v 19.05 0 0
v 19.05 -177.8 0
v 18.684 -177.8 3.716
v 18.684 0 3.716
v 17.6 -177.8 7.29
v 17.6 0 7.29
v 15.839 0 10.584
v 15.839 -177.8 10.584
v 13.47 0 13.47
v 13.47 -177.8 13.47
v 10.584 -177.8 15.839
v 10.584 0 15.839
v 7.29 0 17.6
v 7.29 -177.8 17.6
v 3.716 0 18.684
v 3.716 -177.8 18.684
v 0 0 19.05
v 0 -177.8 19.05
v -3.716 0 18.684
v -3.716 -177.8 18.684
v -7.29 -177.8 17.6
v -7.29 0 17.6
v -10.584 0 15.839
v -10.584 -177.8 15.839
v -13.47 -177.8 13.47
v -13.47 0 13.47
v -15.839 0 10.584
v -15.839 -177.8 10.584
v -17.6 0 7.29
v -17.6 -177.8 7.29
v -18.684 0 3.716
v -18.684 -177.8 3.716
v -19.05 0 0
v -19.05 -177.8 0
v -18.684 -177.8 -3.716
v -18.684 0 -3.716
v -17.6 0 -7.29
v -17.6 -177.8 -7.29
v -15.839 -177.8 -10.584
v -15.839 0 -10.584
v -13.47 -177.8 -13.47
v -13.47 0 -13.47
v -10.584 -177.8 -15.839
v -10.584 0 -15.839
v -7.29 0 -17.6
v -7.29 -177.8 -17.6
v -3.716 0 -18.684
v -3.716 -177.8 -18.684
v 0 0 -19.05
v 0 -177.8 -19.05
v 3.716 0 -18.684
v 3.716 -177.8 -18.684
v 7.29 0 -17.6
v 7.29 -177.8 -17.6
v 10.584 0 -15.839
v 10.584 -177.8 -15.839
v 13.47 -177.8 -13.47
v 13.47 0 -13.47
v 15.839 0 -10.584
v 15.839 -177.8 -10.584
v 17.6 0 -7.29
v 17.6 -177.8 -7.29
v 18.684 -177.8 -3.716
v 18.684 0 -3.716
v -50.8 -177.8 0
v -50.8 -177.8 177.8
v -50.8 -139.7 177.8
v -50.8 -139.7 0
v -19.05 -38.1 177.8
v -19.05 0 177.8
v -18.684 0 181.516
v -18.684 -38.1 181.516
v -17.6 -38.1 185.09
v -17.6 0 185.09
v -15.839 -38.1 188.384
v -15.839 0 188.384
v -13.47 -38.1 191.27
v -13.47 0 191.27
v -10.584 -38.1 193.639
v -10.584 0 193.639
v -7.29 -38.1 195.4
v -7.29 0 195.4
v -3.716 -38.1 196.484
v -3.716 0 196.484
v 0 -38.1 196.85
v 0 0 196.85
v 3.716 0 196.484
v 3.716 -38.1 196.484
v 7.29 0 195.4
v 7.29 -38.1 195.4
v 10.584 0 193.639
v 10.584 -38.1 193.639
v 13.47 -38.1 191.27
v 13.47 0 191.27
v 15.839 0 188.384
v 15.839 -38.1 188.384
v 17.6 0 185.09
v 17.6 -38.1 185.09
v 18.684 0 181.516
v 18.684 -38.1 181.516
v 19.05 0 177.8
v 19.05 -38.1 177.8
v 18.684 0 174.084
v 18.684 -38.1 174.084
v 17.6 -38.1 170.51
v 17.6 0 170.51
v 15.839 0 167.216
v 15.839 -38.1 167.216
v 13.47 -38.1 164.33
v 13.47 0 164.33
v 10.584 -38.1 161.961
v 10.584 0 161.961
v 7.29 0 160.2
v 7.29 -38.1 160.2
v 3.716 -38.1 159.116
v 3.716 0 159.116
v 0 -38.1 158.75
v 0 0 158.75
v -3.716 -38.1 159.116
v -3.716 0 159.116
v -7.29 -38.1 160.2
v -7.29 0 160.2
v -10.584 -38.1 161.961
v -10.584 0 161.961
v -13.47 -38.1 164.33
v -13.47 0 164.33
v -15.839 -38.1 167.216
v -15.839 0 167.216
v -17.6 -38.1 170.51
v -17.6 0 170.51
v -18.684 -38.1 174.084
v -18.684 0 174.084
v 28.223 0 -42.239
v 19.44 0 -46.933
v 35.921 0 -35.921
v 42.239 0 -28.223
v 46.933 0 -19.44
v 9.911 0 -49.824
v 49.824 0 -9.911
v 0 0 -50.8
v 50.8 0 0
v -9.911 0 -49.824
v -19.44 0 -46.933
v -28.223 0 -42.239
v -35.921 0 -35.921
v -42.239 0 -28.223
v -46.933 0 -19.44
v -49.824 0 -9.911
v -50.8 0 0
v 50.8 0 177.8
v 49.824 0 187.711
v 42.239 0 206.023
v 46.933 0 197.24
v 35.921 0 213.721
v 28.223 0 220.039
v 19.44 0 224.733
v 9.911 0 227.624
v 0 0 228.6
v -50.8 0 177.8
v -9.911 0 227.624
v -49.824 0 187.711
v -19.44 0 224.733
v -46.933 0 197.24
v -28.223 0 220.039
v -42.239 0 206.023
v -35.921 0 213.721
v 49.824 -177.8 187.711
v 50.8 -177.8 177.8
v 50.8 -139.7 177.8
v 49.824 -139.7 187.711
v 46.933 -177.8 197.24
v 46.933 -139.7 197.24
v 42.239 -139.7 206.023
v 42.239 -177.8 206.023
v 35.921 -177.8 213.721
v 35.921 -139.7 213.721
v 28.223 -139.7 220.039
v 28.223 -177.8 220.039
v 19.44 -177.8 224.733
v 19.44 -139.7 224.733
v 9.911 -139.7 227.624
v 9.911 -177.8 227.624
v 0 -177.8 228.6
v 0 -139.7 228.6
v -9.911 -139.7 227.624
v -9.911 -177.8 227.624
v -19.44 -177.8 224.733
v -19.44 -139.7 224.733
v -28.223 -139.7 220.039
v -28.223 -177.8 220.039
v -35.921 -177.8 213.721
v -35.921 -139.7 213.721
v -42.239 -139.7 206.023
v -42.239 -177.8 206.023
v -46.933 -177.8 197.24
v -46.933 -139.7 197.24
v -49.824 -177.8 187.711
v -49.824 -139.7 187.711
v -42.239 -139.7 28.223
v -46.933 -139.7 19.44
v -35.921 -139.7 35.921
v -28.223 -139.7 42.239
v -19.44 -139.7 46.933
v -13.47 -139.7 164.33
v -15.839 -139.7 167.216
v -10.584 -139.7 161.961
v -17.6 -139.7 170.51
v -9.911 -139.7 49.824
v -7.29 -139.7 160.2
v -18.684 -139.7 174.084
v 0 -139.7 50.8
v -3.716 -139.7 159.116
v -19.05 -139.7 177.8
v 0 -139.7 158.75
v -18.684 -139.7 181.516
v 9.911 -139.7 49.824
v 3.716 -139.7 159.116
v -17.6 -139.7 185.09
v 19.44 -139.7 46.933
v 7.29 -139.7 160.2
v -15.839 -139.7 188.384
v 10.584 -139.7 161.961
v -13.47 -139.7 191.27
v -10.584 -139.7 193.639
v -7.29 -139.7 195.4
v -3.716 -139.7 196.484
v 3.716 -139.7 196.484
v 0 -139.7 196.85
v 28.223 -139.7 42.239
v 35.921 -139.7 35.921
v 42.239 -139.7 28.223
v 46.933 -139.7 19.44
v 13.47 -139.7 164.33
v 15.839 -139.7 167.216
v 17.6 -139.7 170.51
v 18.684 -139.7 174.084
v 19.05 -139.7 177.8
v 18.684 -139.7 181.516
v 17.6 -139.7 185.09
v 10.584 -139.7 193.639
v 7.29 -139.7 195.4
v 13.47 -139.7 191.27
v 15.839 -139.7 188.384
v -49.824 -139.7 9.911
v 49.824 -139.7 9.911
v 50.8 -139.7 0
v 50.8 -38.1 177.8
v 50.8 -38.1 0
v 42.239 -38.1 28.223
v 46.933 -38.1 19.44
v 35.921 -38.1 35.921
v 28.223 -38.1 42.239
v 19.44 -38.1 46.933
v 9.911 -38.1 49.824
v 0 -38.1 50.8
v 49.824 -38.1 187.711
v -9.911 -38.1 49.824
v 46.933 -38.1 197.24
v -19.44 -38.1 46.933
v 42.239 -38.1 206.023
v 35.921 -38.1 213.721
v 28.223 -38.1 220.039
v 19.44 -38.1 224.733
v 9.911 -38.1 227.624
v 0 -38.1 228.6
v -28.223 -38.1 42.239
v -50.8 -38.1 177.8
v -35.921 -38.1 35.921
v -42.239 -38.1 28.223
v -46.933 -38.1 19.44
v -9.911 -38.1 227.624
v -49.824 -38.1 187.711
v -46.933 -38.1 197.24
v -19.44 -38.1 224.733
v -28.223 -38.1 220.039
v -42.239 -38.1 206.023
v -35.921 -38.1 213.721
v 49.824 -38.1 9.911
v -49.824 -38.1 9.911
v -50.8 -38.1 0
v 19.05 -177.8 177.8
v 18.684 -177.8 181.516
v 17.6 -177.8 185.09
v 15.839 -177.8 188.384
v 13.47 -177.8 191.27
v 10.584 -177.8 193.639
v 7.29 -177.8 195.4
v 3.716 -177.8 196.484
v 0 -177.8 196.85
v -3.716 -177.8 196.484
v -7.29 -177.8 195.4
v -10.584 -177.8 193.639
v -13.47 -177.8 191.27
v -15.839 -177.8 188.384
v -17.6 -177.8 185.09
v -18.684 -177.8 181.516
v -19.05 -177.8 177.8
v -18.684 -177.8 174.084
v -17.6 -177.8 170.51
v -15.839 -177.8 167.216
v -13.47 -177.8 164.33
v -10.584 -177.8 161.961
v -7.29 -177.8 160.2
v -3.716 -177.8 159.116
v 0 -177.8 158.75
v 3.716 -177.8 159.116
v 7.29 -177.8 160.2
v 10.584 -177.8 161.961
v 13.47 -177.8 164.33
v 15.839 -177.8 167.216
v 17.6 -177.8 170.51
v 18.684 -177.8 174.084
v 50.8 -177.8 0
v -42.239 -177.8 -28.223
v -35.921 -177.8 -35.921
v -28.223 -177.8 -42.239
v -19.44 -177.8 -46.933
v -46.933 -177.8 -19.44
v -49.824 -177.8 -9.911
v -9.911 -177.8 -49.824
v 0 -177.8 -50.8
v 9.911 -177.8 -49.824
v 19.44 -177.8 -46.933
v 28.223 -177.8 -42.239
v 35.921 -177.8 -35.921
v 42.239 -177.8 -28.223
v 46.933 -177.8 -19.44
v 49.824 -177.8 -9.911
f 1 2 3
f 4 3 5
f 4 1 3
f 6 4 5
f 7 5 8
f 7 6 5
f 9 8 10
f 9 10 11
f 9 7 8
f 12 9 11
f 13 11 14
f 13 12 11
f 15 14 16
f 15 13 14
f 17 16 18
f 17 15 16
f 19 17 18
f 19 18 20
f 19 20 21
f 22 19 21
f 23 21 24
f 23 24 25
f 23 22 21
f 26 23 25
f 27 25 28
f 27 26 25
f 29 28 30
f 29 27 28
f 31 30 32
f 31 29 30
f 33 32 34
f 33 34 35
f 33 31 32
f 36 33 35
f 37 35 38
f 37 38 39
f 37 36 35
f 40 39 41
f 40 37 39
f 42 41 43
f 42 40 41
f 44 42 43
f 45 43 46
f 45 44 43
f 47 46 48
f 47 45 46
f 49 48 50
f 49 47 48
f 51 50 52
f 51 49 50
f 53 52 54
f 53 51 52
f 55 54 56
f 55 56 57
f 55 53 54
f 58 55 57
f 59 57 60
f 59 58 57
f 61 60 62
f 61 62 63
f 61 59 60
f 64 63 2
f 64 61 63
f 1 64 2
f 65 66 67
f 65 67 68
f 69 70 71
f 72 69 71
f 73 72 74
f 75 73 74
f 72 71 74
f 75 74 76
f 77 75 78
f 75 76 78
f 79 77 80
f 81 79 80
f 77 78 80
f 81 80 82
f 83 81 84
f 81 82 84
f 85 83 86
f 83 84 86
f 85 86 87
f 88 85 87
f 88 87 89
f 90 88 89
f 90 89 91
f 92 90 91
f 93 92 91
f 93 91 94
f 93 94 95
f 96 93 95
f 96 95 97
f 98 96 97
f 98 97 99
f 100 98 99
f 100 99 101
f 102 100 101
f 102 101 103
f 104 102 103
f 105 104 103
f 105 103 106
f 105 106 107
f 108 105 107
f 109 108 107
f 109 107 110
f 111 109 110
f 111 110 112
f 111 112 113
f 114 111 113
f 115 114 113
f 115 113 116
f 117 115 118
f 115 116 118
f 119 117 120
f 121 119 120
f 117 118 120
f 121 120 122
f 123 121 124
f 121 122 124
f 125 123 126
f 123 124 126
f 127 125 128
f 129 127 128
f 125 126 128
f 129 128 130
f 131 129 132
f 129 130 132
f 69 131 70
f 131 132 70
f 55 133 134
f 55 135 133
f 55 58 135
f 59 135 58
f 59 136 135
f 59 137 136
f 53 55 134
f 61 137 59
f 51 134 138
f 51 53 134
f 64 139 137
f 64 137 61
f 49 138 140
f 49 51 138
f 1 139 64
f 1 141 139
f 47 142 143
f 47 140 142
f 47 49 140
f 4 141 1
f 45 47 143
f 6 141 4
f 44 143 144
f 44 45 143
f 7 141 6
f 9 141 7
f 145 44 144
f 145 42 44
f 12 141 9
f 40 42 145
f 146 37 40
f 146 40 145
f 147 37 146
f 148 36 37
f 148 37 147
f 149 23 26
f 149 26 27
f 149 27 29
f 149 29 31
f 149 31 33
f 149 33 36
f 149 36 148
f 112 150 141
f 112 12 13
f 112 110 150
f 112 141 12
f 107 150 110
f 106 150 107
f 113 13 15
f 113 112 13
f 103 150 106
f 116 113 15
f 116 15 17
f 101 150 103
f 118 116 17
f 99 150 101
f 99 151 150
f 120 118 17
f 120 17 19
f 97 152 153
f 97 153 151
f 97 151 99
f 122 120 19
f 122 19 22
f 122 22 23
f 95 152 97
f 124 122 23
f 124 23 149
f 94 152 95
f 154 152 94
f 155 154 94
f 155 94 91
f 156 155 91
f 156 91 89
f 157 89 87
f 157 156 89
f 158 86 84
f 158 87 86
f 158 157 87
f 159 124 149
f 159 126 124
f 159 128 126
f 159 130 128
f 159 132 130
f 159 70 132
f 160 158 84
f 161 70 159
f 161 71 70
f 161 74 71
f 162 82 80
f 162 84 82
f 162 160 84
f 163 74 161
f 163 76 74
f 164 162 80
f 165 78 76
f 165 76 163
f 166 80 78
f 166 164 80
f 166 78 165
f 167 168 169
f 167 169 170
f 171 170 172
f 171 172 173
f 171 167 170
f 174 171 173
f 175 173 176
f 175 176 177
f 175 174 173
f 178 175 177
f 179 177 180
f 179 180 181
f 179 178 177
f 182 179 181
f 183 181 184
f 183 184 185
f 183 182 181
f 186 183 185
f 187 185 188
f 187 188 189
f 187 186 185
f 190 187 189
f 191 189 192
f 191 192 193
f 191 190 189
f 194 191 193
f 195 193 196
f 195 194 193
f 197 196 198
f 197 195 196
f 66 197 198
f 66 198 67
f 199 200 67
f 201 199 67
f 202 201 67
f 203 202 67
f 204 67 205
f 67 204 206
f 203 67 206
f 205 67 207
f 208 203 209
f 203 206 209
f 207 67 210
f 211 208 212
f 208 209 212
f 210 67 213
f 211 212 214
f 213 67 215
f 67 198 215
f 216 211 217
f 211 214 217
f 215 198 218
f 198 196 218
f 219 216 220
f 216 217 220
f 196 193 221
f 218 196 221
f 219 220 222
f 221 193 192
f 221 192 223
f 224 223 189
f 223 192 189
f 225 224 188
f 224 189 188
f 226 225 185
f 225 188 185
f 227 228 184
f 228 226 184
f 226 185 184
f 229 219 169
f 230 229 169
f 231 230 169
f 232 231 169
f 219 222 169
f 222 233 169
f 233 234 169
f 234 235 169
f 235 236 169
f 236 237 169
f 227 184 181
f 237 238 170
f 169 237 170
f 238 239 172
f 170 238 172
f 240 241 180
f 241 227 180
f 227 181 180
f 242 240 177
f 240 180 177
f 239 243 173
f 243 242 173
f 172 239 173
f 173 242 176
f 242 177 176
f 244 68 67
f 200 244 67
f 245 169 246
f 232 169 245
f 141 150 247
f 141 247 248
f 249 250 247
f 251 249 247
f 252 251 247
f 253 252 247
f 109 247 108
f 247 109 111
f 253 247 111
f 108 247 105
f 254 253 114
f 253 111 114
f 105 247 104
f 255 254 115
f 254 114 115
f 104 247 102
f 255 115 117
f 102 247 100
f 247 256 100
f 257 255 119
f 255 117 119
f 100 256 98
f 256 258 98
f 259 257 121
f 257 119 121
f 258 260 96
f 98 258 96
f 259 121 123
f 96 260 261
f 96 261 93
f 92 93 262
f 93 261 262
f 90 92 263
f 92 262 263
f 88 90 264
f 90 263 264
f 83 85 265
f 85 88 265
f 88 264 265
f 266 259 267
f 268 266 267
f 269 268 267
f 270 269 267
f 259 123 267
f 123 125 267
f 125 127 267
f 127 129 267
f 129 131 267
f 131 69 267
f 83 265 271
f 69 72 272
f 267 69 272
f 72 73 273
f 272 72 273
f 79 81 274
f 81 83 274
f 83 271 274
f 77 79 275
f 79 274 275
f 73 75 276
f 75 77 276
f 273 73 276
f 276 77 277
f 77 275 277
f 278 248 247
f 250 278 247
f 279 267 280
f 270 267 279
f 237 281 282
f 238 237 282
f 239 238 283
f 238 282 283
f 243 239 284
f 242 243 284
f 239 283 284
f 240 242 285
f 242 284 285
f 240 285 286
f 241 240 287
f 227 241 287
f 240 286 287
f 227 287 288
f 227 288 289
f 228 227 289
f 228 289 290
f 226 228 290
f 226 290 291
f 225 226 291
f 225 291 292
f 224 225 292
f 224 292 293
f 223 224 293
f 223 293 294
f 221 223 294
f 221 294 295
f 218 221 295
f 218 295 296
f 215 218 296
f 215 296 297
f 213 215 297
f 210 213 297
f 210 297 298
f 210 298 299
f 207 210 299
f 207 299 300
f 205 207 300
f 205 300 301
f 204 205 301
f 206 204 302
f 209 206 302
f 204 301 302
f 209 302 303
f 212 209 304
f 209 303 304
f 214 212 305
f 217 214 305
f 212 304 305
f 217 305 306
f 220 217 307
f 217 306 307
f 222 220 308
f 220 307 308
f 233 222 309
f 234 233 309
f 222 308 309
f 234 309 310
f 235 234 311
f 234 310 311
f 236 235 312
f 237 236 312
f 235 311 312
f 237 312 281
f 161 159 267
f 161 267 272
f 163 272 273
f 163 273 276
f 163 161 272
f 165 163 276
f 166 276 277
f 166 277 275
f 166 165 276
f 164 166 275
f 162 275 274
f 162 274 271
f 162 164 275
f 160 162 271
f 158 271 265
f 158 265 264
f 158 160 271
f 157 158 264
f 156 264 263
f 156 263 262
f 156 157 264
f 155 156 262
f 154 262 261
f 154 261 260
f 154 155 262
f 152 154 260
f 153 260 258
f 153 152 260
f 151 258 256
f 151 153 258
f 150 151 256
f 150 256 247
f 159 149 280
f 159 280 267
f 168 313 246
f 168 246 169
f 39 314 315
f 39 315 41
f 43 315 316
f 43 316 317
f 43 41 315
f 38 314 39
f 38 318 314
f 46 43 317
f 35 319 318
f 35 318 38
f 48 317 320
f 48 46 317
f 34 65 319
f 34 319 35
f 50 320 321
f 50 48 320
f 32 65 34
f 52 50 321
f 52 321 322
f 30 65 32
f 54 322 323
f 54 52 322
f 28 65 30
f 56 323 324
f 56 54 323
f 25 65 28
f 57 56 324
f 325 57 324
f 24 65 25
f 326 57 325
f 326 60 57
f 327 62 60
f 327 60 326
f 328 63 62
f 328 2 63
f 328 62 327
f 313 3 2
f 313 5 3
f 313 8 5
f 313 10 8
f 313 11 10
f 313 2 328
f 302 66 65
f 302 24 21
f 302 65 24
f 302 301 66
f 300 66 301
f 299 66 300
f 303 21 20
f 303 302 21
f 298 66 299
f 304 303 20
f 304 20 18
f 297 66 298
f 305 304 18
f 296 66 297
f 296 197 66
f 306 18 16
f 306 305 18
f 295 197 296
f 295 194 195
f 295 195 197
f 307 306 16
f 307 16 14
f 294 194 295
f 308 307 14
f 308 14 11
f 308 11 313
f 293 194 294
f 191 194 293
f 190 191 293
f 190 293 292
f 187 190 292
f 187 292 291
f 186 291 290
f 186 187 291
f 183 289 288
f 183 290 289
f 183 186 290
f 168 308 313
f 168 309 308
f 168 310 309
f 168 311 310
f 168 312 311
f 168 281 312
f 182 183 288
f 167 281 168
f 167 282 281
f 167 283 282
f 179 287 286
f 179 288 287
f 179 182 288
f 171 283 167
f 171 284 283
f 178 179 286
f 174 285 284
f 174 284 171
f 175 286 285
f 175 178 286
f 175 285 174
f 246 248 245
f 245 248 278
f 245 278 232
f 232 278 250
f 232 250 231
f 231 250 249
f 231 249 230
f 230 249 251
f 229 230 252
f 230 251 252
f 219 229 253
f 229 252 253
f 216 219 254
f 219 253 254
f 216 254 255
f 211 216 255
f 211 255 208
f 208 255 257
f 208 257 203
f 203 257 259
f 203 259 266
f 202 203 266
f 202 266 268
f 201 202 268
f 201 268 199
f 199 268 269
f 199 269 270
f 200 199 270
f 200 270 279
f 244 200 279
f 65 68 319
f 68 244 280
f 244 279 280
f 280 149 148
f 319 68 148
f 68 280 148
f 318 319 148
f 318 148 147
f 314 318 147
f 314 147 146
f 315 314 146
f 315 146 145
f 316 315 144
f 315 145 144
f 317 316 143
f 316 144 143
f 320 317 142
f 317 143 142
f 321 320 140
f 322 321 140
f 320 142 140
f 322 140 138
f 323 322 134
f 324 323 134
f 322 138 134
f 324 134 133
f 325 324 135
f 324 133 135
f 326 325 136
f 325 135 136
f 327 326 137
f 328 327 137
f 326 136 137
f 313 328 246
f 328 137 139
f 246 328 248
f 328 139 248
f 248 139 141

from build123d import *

# Parameters (mm, degrees)
F0_R     = 50.8
F0_R_2   = 19.05
F1_DEPTH = 177.8
F3_DEPTH = 38.1
F5_DEPTH = 38.1
F6_R     = 19.05
F7_DEPTH = 66.802
F8_R     = 19.05
F9_DEPTH = 106.68


with BuildPart() as f1:
    # F0 (on Front) → F1 (new body)
    with BuildSketch(Plane.XZ):
        Circle(F0_R)
        Circle(F0_R_2, mode=Mode.SUBTRACT)
    extrude(amount=F1_DEPTH)

    # F2 (on face) → F3 (join)
    with BuildSketch(Plane.XZ.offset(177.8)):
        with BuildLine():
            Line((-50.8, 177.8), (-50.8, 0))
            ThreePointArc((-50.8, 0), (0, 50.8), (50.8, 0))
            Line((50.8, 0), (50.8, 177.8))
            ThreePointArc((50.8, 177.8), (0, 228.6), (-50.8, 177.8))
        make_face()
    extrude(amount=-F3_DEPTH)

    # F4 (on face) → F5 (join)
    with BuildSketch(Plane(origin=(0, 0, 0), x_dir=(-1, 0, 0), z_dir=(0, 1, 0))):
        with BuildLine():
            Line((-50.8, 177.8), (-50.8, 0))
            ThreePointArc((-50.8, 0), (0, 50.8), (50.8, 0))
            Line((50.8, 0), (50.8, 177.8))
            ThreePointArc((50.8, 177.8), (0, 228.6), (-50.8, 177.8))
        make_face()
    extrude(amount=-F5_DEPTH)

    # F6 (on face) → F7 (cut)
    with BuildSketch(Plane.XZ.offset(177.8)):
        with Locations((0, 177.8)):
            Circle(F6_R)
    extrude(amount=-F7_DEPTH, mode=Mode.SUBTRACT)

    # F8 (on face) → F9 (cut)
    with BuildSketch(Plane(origin=(0, 0, 0), x_dir=(-1, 0, 0), z_dir=(0, 1, 0))):
        with Locations((0, 177.8)):
            Circle(F8_R)
    extrude(amount=-F9_DEPTH, mode=Mode.SUBTRACT)


solid = f1.part
